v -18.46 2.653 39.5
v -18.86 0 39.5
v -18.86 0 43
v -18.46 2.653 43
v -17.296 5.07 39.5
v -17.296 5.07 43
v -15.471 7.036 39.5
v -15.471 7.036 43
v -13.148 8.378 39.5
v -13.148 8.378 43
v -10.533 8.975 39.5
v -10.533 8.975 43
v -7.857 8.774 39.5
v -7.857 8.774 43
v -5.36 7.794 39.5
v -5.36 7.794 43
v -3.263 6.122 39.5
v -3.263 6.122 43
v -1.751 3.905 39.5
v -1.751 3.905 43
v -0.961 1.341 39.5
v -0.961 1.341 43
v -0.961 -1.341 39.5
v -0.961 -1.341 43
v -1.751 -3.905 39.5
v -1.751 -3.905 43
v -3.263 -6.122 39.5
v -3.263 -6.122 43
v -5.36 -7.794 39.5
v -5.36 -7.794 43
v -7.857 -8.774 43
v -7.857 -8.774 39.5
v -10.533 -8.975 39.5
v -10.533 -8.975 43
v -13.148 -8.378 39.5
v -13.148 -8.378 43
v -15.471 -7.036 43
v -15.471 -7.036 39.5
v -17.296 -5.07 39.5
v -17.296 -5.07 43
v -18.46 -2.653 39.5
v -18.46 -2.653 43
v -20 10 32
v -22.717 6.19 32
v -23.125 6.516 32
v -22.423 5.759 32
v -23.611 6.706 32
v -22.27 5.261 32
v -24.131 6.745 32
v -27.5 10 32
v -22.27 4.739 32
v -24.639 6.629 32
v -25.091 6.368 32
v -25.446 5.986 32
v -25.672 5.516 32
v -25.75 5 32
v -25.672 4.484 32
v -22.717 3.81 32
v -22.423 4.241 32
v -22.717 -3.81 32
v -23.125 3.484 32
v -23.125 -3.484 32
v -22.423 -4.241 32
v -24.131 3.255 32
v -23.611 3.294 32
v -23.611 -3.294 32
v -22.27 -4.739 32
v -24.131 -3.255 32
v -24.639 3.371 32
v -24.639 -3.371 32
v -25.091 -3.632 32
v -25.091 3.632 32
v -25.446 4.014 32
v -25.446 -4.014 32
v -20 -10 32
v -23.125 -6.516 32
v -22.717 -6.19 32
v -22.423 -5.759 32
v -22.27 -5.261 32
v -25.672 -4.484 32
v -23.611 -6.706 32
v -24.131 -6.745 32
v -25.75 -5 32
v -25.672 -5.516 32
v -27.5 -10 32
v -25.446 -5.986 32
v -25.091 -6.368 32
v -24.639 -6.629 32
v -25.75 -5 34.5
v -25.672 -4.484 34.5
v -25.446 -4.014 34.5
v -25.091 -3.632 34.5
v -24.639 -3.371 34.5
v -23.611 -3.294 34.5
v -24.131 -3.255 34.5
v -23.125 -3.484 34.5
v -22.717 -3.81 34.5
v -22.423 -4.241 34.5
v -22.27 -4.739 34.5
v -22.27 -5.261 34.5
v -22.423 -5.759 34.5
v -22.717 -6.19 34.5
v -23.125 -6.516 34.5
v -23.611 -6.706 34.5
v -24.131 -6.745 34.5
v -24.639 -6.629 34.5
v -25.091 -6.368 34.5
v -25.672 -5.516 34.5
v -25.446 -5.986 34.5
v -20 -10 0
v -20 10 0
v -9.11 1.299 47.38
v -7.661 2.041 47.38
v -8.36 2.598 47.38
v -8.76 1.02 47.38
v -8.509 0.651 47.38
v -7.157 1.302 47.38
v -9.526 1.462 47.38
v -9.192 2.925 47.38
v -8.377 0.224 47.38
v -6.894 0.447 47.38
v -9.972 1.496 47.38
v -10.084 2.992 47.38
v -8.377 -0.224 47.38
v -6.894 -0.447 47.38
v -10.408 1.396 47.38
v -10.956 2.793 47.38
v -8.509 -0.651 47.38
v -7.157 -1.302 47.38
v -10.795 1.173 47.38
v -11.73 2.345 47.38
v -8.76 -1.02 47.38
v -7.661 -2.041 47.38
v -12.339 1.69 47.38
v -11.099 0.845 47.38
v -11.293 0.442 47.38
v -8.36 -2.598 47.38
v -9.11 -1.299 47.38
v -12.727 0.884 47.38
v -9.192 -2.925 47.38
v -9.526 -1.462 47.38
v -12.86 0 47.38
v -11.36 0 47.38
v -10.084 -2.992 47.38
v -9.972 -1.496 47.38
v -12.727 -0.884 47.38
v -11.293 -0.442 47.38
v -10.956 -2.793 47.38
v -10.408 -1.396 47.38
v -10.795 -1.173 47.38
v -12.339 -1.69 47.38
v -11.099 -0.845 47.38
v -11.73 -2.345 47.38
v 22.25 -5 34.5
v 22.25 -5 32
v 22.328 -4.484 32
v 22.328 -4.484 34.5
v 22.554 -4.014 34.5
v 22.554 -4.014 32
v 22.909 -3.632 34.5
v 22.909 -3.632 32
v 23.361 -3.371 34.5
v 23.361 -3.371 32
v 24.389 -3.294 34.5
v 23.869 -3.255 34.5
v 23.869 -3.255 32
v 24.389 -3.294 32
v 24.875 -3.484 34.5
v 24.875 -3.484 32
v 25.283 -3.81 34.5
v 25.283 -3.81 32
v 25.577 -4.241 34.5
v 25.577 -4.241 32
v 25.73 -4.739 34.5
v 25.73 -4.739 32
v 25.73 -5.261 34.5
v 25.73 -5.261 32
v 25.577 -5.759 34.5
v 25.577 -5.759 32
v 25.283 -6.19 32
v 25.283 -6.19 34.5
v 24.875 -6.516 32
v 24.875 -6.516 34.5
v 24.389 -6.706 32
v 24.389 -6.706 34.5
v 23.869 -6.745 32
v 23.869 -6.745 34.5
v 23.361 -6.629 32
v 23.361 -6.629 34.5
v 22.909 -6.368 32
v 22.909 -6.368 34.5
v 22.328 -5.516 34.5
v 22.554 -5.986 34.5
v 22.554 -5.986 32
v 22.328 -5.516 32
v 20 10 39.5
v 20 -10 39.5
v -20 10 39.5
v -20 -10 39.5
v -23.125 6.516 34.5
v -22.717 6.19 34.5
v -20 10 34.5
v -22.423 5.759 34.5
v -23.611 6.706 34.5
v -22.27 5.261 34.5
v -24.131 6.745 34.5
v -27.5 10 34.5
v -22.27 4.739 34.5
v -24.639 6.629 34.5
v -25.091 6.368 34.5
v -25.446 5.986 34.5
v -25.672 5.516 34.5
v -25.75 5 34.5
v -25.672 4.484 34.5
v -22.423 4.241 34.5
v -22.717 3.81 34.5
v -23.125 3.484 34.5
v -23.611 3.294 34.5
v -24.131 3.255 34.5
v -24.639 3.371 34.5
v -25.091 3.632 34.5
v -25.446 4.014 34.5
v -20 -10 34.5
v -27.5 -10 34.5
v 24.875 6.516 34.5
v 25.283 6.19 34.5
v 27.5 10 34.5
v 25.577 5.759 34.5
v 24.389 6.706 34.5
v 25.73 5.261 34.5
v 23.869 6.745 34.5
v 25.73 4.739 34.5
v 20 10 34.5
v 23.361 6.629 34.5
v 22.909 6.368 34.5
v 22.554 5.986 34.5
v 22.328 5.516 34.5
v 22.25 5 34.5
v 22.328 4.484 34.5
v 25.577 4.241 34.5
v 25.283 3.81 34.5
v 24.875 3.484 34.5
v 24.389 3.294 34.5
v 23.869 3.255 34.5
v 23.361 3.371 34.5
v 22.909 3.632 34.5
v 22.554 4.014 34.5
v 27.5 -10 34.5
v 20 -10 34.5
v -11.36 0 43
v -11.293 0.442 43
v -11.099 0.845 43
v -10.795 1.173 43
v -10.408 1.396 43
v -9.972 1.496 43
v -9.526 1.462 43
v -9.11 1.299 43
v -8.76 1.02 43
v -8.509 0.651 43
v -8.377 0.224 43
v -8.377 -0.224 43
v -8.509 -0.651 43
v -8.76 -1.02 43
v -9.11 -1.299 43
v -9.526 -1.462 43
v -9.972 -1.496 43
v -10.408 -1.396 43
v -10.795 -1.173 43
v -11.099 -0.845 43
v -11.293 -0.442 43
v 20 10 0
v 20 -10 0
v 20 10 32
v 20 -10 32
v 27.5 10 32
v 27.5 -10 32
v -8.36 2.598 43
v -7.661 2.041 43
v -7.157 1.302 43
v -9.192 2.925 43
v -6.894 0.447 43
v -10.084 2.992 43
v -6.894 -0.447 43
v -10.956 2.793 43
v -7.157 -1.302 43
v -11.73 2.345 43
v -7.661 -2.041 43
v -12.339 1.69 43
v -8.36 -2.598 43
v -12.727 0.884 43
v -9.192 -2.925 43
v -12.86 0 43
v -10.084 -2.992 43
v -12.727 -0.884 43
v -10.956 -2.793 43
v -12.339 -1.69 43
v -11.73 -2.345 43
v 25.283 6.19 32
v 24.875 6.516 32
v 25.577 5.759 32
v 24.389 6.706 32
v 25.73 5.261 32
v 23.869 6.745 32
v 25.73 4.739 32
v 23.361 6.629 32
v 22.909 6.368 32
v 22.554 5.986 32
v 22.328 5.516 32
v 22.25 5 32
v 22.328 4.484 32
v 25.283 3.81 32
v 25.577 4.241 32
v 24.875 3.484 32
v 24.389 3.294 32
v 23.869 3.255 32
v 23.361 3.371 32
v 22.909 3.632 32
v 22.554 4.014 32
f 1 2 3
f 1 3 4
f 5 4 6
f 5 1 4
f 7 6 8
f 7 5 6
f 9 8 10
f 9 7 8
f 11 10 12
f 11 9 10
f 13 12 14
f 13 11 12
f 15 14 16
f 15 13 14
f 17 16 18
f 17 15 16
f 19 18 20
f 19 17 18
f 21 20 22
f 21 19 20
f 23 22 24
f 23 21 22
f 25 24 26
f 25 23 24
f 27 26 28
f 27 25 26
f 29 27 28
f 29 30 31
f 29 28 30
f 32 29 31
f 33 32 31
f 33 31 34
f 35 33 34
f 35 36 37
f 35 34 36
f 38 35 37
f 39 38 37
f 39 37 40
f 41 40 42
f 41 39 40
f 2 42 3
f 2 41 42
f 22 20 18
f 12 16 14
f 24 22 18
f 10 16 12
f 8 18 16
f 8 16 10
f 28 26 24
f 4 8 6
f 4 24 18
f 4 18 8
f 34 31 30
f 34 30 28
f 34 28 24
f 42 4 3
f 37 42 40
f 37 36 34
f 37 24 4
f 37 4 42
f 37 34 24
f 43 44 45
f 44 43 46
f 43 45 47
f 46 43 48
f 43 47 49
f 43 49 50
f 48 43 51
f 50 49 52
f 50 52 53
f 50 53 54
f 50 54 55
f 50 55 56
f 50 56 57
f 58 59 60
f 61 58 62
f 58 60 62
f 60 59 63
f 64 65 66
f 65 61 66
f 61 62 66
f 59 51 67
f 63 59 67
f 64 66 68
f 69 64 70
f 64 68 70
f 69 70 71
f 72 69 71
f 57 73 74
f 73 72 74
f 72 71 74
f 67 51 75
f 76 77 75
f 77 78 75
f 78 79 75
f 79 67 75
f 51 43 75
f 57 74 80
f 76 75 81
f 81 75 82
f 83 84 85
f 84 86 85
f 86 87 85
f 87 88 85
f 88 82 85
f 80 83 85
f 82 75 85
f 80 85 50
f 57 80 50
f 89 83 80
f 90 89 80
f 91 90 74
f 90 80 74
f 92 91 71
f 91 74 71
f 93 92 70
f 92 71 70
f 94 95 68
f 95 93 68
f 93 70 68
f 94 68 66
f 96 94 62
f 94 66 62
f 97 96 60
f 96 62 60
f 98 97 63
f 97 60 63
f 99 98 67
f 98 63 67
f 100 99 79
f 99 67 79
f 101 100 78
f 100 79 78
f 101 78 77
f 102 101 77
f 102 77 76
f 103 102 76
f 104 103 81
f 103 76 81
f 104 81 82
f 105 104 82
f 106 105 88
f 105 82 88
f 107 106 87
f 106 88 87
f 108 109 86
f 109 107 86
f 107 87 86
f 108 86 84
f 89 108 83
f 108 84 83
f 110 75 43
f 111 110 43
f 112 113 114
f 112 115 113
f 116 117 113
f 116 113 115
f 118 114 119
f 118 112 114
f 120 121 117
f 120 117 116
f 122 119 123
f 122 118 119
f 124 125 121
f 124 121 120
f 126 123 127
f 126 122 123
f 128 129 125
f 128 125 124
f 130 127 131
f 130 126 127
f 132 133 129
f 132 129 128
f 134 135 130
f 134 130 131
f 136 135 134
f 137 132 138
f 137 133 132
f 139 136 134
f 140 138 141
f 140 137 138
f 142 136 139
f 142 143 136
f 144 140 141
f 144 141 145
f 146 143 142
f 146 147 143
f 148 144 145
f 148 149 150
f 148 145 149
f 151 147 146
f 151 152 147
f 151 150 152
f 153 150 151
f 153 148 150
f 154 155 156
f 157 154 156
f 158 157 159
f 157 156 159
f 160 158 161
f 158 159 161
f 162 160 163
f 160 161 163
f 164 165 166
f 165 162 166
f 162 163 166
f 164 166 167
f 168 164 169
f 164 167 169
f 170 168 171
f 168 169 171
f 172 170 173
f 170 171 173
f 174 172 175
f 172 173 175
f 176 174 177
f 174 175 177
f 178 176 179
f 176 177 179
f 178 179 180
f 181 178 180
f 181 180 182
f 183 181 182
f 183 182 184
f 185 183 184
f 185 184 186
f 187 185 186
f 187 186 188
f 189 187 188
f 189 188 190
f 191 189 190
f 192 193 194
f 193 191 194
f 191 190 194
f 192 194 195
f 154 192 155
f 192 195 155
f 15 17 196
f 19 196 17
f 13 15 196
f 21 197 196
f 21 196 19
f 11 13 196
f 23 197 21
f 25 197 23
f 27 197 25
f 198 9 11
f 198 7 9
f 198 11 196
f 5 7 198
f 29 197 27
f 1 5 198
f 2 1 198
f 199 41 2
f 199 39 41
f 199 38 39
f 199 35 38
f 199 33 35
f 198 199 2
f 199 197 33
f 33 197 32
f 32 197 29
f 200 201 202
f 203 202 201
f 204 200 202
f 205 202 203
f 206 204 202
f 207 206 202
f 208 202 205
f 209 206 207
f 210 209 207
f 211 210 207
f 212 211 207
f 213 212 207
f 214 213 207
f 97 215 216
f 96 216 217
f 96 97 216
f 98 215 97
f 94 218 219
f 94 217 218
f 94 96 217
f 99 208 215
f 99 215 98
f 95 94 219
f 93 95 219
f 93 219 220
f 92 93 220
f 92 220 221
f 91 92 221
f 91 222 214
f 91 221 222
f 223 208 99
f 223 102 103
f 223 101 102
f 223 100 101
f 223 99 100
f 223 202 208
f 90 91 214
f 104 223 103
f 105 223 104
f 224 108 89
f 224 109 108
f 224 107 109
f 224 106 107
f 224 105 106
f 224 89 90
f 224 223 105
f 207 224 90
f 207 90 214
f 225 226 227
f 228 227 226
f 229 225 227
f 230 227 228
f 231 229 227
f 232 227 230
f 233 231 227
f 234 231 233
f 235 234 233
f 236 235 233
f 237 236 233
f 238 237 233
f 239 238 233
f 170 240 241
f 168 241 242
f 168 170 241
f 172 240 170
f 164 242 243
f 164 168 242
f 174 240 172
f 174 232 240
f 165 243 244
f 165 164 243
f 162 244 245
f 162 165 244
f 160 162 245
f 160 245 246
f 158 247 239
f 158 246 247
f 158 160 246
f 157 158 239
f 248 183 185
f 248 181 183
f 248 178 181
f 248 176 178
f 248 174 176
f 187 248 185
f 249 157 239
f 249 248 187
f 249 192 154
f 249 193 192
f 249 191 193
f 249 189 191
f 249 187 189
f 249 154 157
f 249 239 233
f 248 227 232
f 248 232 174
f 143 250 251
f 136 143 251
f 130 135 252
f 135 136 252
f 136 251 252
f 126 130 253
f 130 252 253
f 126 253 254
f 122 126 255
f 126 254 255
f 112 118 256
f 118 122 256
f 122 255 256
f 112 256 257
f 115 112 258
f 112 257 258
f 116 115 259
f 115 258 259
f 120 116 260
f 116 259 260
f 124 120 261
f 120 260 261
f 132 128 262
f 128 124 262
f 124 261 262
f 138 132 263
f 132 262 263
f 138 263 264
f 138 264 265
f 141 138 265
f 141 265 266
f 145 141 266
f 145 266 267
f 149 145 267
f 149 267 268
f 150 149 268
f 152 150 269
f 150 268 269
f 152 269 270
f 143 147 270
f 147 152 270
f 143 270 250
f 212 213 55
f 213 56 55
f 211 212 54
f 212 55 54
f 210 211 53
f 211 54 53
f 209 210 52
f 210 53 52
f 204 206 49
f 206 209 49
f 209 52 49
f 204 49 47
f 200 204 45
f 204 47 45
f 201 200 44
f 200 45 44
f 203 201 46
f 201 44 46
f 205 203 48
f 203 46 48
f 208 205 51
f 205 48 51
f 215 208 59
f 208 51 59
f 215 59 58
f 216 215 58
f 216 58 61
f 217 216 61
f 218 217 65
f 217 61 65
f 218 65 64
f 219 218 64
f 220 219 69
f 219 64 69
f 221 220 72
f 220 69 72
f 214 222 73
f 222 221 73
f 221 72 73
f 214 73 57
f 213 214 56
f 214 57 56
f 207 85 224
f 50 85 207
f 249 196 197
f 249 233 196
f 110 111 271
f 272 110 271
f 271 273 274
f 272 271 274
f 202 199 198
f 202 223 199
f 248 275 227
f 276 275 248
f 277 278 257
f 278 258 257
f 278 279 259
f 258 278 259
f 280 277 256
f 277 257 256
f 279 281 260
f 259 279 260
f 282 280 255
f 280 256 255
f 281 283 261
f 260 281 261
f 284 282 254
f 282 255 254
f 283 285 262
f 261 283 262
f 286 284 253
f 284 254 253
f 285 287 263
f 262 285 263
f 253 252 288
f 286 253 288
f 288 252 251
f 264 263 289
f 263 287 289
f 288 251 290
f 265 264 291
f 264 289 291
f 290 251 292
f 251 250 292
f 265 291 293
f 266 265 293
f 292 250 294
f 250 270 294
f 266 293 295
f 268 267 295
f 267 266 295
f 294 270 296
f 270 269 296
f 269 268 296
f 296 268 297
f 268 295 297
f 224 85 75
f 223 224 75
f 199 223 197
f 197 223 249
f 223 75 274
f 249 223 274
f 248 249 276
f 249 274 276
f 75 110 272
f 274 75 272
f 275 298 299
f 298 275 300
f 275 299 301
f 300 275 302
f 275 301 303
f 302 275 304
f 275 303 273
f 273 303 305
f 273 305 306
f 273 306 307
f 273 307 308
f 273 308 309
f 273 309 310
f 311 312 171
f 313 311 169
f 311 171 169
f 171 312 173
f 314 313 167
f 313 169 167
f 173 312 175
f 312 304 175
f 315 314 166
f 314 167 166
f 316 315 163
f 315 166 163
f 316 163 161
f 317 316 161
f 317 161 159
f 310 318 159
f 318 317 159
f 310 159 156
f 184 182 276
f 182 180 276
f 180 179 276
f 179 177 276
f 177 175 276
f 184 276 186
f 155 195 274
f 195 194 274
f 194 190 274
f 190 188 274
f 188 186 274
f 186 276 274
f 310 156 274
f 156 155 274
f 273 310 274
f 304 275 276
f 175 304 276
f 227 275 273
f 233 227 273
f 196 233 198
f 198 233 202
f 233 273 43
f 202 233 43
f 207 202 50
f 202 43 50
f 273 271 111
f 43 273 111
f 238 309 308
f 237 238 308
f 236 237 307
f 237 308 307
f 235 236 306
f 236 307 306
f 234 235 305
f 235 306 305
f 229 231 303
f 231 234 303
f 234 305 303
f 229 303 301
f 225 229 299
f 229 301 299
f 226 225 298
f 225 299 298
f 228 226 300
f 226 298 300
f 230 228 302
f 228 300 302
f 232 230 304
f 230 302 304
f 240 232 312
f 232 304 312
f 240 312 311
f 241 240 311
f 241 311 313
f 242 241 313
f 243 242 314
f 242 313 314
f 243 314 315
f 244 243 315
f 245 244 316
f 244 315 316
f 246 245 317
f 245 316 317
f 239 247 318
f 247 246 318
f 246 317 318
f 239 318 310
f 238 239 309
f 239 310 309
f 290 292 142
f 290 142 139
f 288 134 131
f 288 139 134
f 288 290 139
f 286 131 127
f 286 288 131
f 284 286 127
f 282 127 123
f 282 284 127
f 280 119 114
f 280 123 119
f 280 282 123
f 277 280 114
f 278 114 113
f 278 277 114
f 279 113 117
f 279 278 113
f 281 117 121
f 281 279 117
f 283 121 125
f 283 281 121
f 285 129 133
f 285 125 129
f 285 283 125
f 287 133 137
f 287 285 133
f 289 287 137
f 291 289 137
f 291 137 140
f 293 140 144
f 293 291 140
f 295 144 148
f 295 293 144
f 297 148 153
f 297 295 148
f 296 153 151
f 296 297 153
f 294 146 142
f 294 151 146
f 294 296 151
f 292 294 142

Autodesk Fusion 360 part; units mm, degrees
sketch "草图1" plane through (0, 0, 0) normal (0, 0, 1) x (1, 0, 0)
  line L0 (20, -10) -> (-20, -10)
  line L1 (-20, -10) -> (-20, 10)
  line L2 (-20, 10) -> (20, 10)
  line L3 (20, 10) -> (20, -10)
  line L4 (20, -10) -> (-20, 10) construction
  line L5 (-20, -10) -> (20, 10) construction
  dimension "d1" = 20
  dimension "d2" = 40
extrude "拉伸1" add sketch "草图1" along normal blind 32 makes body 1
sketch "草图2" plane through (0, 0, 32) normal (0, 0, 1) x (-1, 0, 0)
  line L0 (-20, -10) -> (20, -10)
  line L1 (20, -10) -> (20, 10)
  line L2 (20, 10) -> (-20, 10)
  line L3 (-20, 10) -> (-20, -10)
  line L4 (-27.5, 10) -> (27.5, 10)
  line L5 (27.5, 10) -> (27.5, -10)
  line L6 (27.5, -10) -> (-27.5, -10)
  line L7 (-27.5, -10) -> (-27.5, 10)
  line L8 (-27.5, 10) -> (27.5, -10) construction
  line L9 (27.5, 10) -> (-27.5, -10) construction
  line L10 (34, 0) -> (-45, 0)
  line L11 (0, -20) -> (0, 28)
  circle A0 centre (24, -5) radius 1.75
  circle A1 centre (-24, -5) radius 1.75
  circle A2 centre (24, 5) radius 1.75
  circle A3 centre (-24, 5) radius 1.75
  dimension "d5" = 20
  dimension "d6" = 55
  dimension "d7" = 3.5
  dimension "d8" = 48
  dimension "d9" = 10
extrude "拉伸2" add sketch "草图2" along normal blind 2.5 bodies 1
sketch "草图4" plane through (0, 0, 34.5) normal (0, 0, 1) x (-1, 0, 0)
  circle A0 centre (24, 5) radius 1.75
  circle A1 centre (24, -5) radius 1.75
  circle A2 centre (-24, 5) radius 1.75
  circle A3 centre (-24, -5) radius 1.75
  line L0 (-27.5, -10) -> (27.5, -10)
  line L1 (27.5, -10) -> (27.5, 10)
  line L2 (27.5, 10) -> (-27.5, 10)
  line L3 (-27.5, 10) -> (-27.5, -10)
  line L4 (-20, 10) -> (20, 10)
  line L5 (20, 10) -> (20, -10)
  line L6 (20, -10) -> (-20, -10)
  line L7 (-20, -10) -> (-20, 10)
  line L8 (-20, 10) -> (20, -10) construction
  line L9 (20, 10) -> (-20, -10) construction
  dimension "d12" = 20
  dimension "d13" = 40
extrude "拉伸3" add sketch "草图4" along normal blind 5 contours L0 L2 L4 L5 L6 L7 bodies 1
sketch "草图5" plane through (0, 0, 39.5) normal (0, 0, 1) x (-1, 0, 0)
  line L0 (-20, -10) -> (20, -10)
  line L1 (20, -10) -> (20, 10)
  line L2 (20, 10) -> (-20, 10)
  line L3 (-20, 10) -> (-20, -10)
  line L4 (-20, -10) -> (-20, 10)
  line L5 (-20, 10) -> (-27.5, 10)
  line L6 (-27.5, 10) -> (-27.5, -10)
  line L7 (-27.5, -10) -> (-20, -10)
  circle A0 centre (-24, 5) radius 1.75
  circle A1 centre (-24, -5) radius 1.75
  line L8 (20, 10) -> (20, -10)
  line L9 (20, -10) -> (27.5, -10)
  line L10 (27.5, -10) -> (27.5, 10)
  line L11 (27.5, 10) -> (20, 10)
  circle A2 centre (24, -5) radius 1.75
  circle A3 centre (24, 5) radius 1.75
  circle A4 centre (9.86, 0) radius 9
  dimension "d16" = 33.86
  dimension "d17" = 18
extrude "拉伸4" add sketch "草图5" along normal blind 3.5 contours A4 bodies 1
sketch "草图6" plane through (0, 0, 43) normal (0, 0, 1) x (-1, 0, 0)
  circle A0 centre (9.86, 0) radius 9
  circle A1 centre (9.86, 0) radius 3
  circle A2 centre (9.86, 0) radius 1.5
  dimension "d20" = 6
  dimension "d21" = 3
extrude "拉伸5" add sketch "草图6" along normal blind 4.38 separate body contours A1 makes body 2
copy_body "实体->零部件1" bodies 1 removing the originals makes body 3 in component "Component'"
copy_body "实体->零部件2" bodies 2 removing the originals makes body 4 in component "Component''"
component "Component'" placed x (1, 0, 0) y (0, 1, 0) z (0, 0, 1) at (0, 0, 0)
component "Component''" placed x (1, 0, 0) y (0, 1, 0) z (0, 0, 1) at (0, 0, 0)
